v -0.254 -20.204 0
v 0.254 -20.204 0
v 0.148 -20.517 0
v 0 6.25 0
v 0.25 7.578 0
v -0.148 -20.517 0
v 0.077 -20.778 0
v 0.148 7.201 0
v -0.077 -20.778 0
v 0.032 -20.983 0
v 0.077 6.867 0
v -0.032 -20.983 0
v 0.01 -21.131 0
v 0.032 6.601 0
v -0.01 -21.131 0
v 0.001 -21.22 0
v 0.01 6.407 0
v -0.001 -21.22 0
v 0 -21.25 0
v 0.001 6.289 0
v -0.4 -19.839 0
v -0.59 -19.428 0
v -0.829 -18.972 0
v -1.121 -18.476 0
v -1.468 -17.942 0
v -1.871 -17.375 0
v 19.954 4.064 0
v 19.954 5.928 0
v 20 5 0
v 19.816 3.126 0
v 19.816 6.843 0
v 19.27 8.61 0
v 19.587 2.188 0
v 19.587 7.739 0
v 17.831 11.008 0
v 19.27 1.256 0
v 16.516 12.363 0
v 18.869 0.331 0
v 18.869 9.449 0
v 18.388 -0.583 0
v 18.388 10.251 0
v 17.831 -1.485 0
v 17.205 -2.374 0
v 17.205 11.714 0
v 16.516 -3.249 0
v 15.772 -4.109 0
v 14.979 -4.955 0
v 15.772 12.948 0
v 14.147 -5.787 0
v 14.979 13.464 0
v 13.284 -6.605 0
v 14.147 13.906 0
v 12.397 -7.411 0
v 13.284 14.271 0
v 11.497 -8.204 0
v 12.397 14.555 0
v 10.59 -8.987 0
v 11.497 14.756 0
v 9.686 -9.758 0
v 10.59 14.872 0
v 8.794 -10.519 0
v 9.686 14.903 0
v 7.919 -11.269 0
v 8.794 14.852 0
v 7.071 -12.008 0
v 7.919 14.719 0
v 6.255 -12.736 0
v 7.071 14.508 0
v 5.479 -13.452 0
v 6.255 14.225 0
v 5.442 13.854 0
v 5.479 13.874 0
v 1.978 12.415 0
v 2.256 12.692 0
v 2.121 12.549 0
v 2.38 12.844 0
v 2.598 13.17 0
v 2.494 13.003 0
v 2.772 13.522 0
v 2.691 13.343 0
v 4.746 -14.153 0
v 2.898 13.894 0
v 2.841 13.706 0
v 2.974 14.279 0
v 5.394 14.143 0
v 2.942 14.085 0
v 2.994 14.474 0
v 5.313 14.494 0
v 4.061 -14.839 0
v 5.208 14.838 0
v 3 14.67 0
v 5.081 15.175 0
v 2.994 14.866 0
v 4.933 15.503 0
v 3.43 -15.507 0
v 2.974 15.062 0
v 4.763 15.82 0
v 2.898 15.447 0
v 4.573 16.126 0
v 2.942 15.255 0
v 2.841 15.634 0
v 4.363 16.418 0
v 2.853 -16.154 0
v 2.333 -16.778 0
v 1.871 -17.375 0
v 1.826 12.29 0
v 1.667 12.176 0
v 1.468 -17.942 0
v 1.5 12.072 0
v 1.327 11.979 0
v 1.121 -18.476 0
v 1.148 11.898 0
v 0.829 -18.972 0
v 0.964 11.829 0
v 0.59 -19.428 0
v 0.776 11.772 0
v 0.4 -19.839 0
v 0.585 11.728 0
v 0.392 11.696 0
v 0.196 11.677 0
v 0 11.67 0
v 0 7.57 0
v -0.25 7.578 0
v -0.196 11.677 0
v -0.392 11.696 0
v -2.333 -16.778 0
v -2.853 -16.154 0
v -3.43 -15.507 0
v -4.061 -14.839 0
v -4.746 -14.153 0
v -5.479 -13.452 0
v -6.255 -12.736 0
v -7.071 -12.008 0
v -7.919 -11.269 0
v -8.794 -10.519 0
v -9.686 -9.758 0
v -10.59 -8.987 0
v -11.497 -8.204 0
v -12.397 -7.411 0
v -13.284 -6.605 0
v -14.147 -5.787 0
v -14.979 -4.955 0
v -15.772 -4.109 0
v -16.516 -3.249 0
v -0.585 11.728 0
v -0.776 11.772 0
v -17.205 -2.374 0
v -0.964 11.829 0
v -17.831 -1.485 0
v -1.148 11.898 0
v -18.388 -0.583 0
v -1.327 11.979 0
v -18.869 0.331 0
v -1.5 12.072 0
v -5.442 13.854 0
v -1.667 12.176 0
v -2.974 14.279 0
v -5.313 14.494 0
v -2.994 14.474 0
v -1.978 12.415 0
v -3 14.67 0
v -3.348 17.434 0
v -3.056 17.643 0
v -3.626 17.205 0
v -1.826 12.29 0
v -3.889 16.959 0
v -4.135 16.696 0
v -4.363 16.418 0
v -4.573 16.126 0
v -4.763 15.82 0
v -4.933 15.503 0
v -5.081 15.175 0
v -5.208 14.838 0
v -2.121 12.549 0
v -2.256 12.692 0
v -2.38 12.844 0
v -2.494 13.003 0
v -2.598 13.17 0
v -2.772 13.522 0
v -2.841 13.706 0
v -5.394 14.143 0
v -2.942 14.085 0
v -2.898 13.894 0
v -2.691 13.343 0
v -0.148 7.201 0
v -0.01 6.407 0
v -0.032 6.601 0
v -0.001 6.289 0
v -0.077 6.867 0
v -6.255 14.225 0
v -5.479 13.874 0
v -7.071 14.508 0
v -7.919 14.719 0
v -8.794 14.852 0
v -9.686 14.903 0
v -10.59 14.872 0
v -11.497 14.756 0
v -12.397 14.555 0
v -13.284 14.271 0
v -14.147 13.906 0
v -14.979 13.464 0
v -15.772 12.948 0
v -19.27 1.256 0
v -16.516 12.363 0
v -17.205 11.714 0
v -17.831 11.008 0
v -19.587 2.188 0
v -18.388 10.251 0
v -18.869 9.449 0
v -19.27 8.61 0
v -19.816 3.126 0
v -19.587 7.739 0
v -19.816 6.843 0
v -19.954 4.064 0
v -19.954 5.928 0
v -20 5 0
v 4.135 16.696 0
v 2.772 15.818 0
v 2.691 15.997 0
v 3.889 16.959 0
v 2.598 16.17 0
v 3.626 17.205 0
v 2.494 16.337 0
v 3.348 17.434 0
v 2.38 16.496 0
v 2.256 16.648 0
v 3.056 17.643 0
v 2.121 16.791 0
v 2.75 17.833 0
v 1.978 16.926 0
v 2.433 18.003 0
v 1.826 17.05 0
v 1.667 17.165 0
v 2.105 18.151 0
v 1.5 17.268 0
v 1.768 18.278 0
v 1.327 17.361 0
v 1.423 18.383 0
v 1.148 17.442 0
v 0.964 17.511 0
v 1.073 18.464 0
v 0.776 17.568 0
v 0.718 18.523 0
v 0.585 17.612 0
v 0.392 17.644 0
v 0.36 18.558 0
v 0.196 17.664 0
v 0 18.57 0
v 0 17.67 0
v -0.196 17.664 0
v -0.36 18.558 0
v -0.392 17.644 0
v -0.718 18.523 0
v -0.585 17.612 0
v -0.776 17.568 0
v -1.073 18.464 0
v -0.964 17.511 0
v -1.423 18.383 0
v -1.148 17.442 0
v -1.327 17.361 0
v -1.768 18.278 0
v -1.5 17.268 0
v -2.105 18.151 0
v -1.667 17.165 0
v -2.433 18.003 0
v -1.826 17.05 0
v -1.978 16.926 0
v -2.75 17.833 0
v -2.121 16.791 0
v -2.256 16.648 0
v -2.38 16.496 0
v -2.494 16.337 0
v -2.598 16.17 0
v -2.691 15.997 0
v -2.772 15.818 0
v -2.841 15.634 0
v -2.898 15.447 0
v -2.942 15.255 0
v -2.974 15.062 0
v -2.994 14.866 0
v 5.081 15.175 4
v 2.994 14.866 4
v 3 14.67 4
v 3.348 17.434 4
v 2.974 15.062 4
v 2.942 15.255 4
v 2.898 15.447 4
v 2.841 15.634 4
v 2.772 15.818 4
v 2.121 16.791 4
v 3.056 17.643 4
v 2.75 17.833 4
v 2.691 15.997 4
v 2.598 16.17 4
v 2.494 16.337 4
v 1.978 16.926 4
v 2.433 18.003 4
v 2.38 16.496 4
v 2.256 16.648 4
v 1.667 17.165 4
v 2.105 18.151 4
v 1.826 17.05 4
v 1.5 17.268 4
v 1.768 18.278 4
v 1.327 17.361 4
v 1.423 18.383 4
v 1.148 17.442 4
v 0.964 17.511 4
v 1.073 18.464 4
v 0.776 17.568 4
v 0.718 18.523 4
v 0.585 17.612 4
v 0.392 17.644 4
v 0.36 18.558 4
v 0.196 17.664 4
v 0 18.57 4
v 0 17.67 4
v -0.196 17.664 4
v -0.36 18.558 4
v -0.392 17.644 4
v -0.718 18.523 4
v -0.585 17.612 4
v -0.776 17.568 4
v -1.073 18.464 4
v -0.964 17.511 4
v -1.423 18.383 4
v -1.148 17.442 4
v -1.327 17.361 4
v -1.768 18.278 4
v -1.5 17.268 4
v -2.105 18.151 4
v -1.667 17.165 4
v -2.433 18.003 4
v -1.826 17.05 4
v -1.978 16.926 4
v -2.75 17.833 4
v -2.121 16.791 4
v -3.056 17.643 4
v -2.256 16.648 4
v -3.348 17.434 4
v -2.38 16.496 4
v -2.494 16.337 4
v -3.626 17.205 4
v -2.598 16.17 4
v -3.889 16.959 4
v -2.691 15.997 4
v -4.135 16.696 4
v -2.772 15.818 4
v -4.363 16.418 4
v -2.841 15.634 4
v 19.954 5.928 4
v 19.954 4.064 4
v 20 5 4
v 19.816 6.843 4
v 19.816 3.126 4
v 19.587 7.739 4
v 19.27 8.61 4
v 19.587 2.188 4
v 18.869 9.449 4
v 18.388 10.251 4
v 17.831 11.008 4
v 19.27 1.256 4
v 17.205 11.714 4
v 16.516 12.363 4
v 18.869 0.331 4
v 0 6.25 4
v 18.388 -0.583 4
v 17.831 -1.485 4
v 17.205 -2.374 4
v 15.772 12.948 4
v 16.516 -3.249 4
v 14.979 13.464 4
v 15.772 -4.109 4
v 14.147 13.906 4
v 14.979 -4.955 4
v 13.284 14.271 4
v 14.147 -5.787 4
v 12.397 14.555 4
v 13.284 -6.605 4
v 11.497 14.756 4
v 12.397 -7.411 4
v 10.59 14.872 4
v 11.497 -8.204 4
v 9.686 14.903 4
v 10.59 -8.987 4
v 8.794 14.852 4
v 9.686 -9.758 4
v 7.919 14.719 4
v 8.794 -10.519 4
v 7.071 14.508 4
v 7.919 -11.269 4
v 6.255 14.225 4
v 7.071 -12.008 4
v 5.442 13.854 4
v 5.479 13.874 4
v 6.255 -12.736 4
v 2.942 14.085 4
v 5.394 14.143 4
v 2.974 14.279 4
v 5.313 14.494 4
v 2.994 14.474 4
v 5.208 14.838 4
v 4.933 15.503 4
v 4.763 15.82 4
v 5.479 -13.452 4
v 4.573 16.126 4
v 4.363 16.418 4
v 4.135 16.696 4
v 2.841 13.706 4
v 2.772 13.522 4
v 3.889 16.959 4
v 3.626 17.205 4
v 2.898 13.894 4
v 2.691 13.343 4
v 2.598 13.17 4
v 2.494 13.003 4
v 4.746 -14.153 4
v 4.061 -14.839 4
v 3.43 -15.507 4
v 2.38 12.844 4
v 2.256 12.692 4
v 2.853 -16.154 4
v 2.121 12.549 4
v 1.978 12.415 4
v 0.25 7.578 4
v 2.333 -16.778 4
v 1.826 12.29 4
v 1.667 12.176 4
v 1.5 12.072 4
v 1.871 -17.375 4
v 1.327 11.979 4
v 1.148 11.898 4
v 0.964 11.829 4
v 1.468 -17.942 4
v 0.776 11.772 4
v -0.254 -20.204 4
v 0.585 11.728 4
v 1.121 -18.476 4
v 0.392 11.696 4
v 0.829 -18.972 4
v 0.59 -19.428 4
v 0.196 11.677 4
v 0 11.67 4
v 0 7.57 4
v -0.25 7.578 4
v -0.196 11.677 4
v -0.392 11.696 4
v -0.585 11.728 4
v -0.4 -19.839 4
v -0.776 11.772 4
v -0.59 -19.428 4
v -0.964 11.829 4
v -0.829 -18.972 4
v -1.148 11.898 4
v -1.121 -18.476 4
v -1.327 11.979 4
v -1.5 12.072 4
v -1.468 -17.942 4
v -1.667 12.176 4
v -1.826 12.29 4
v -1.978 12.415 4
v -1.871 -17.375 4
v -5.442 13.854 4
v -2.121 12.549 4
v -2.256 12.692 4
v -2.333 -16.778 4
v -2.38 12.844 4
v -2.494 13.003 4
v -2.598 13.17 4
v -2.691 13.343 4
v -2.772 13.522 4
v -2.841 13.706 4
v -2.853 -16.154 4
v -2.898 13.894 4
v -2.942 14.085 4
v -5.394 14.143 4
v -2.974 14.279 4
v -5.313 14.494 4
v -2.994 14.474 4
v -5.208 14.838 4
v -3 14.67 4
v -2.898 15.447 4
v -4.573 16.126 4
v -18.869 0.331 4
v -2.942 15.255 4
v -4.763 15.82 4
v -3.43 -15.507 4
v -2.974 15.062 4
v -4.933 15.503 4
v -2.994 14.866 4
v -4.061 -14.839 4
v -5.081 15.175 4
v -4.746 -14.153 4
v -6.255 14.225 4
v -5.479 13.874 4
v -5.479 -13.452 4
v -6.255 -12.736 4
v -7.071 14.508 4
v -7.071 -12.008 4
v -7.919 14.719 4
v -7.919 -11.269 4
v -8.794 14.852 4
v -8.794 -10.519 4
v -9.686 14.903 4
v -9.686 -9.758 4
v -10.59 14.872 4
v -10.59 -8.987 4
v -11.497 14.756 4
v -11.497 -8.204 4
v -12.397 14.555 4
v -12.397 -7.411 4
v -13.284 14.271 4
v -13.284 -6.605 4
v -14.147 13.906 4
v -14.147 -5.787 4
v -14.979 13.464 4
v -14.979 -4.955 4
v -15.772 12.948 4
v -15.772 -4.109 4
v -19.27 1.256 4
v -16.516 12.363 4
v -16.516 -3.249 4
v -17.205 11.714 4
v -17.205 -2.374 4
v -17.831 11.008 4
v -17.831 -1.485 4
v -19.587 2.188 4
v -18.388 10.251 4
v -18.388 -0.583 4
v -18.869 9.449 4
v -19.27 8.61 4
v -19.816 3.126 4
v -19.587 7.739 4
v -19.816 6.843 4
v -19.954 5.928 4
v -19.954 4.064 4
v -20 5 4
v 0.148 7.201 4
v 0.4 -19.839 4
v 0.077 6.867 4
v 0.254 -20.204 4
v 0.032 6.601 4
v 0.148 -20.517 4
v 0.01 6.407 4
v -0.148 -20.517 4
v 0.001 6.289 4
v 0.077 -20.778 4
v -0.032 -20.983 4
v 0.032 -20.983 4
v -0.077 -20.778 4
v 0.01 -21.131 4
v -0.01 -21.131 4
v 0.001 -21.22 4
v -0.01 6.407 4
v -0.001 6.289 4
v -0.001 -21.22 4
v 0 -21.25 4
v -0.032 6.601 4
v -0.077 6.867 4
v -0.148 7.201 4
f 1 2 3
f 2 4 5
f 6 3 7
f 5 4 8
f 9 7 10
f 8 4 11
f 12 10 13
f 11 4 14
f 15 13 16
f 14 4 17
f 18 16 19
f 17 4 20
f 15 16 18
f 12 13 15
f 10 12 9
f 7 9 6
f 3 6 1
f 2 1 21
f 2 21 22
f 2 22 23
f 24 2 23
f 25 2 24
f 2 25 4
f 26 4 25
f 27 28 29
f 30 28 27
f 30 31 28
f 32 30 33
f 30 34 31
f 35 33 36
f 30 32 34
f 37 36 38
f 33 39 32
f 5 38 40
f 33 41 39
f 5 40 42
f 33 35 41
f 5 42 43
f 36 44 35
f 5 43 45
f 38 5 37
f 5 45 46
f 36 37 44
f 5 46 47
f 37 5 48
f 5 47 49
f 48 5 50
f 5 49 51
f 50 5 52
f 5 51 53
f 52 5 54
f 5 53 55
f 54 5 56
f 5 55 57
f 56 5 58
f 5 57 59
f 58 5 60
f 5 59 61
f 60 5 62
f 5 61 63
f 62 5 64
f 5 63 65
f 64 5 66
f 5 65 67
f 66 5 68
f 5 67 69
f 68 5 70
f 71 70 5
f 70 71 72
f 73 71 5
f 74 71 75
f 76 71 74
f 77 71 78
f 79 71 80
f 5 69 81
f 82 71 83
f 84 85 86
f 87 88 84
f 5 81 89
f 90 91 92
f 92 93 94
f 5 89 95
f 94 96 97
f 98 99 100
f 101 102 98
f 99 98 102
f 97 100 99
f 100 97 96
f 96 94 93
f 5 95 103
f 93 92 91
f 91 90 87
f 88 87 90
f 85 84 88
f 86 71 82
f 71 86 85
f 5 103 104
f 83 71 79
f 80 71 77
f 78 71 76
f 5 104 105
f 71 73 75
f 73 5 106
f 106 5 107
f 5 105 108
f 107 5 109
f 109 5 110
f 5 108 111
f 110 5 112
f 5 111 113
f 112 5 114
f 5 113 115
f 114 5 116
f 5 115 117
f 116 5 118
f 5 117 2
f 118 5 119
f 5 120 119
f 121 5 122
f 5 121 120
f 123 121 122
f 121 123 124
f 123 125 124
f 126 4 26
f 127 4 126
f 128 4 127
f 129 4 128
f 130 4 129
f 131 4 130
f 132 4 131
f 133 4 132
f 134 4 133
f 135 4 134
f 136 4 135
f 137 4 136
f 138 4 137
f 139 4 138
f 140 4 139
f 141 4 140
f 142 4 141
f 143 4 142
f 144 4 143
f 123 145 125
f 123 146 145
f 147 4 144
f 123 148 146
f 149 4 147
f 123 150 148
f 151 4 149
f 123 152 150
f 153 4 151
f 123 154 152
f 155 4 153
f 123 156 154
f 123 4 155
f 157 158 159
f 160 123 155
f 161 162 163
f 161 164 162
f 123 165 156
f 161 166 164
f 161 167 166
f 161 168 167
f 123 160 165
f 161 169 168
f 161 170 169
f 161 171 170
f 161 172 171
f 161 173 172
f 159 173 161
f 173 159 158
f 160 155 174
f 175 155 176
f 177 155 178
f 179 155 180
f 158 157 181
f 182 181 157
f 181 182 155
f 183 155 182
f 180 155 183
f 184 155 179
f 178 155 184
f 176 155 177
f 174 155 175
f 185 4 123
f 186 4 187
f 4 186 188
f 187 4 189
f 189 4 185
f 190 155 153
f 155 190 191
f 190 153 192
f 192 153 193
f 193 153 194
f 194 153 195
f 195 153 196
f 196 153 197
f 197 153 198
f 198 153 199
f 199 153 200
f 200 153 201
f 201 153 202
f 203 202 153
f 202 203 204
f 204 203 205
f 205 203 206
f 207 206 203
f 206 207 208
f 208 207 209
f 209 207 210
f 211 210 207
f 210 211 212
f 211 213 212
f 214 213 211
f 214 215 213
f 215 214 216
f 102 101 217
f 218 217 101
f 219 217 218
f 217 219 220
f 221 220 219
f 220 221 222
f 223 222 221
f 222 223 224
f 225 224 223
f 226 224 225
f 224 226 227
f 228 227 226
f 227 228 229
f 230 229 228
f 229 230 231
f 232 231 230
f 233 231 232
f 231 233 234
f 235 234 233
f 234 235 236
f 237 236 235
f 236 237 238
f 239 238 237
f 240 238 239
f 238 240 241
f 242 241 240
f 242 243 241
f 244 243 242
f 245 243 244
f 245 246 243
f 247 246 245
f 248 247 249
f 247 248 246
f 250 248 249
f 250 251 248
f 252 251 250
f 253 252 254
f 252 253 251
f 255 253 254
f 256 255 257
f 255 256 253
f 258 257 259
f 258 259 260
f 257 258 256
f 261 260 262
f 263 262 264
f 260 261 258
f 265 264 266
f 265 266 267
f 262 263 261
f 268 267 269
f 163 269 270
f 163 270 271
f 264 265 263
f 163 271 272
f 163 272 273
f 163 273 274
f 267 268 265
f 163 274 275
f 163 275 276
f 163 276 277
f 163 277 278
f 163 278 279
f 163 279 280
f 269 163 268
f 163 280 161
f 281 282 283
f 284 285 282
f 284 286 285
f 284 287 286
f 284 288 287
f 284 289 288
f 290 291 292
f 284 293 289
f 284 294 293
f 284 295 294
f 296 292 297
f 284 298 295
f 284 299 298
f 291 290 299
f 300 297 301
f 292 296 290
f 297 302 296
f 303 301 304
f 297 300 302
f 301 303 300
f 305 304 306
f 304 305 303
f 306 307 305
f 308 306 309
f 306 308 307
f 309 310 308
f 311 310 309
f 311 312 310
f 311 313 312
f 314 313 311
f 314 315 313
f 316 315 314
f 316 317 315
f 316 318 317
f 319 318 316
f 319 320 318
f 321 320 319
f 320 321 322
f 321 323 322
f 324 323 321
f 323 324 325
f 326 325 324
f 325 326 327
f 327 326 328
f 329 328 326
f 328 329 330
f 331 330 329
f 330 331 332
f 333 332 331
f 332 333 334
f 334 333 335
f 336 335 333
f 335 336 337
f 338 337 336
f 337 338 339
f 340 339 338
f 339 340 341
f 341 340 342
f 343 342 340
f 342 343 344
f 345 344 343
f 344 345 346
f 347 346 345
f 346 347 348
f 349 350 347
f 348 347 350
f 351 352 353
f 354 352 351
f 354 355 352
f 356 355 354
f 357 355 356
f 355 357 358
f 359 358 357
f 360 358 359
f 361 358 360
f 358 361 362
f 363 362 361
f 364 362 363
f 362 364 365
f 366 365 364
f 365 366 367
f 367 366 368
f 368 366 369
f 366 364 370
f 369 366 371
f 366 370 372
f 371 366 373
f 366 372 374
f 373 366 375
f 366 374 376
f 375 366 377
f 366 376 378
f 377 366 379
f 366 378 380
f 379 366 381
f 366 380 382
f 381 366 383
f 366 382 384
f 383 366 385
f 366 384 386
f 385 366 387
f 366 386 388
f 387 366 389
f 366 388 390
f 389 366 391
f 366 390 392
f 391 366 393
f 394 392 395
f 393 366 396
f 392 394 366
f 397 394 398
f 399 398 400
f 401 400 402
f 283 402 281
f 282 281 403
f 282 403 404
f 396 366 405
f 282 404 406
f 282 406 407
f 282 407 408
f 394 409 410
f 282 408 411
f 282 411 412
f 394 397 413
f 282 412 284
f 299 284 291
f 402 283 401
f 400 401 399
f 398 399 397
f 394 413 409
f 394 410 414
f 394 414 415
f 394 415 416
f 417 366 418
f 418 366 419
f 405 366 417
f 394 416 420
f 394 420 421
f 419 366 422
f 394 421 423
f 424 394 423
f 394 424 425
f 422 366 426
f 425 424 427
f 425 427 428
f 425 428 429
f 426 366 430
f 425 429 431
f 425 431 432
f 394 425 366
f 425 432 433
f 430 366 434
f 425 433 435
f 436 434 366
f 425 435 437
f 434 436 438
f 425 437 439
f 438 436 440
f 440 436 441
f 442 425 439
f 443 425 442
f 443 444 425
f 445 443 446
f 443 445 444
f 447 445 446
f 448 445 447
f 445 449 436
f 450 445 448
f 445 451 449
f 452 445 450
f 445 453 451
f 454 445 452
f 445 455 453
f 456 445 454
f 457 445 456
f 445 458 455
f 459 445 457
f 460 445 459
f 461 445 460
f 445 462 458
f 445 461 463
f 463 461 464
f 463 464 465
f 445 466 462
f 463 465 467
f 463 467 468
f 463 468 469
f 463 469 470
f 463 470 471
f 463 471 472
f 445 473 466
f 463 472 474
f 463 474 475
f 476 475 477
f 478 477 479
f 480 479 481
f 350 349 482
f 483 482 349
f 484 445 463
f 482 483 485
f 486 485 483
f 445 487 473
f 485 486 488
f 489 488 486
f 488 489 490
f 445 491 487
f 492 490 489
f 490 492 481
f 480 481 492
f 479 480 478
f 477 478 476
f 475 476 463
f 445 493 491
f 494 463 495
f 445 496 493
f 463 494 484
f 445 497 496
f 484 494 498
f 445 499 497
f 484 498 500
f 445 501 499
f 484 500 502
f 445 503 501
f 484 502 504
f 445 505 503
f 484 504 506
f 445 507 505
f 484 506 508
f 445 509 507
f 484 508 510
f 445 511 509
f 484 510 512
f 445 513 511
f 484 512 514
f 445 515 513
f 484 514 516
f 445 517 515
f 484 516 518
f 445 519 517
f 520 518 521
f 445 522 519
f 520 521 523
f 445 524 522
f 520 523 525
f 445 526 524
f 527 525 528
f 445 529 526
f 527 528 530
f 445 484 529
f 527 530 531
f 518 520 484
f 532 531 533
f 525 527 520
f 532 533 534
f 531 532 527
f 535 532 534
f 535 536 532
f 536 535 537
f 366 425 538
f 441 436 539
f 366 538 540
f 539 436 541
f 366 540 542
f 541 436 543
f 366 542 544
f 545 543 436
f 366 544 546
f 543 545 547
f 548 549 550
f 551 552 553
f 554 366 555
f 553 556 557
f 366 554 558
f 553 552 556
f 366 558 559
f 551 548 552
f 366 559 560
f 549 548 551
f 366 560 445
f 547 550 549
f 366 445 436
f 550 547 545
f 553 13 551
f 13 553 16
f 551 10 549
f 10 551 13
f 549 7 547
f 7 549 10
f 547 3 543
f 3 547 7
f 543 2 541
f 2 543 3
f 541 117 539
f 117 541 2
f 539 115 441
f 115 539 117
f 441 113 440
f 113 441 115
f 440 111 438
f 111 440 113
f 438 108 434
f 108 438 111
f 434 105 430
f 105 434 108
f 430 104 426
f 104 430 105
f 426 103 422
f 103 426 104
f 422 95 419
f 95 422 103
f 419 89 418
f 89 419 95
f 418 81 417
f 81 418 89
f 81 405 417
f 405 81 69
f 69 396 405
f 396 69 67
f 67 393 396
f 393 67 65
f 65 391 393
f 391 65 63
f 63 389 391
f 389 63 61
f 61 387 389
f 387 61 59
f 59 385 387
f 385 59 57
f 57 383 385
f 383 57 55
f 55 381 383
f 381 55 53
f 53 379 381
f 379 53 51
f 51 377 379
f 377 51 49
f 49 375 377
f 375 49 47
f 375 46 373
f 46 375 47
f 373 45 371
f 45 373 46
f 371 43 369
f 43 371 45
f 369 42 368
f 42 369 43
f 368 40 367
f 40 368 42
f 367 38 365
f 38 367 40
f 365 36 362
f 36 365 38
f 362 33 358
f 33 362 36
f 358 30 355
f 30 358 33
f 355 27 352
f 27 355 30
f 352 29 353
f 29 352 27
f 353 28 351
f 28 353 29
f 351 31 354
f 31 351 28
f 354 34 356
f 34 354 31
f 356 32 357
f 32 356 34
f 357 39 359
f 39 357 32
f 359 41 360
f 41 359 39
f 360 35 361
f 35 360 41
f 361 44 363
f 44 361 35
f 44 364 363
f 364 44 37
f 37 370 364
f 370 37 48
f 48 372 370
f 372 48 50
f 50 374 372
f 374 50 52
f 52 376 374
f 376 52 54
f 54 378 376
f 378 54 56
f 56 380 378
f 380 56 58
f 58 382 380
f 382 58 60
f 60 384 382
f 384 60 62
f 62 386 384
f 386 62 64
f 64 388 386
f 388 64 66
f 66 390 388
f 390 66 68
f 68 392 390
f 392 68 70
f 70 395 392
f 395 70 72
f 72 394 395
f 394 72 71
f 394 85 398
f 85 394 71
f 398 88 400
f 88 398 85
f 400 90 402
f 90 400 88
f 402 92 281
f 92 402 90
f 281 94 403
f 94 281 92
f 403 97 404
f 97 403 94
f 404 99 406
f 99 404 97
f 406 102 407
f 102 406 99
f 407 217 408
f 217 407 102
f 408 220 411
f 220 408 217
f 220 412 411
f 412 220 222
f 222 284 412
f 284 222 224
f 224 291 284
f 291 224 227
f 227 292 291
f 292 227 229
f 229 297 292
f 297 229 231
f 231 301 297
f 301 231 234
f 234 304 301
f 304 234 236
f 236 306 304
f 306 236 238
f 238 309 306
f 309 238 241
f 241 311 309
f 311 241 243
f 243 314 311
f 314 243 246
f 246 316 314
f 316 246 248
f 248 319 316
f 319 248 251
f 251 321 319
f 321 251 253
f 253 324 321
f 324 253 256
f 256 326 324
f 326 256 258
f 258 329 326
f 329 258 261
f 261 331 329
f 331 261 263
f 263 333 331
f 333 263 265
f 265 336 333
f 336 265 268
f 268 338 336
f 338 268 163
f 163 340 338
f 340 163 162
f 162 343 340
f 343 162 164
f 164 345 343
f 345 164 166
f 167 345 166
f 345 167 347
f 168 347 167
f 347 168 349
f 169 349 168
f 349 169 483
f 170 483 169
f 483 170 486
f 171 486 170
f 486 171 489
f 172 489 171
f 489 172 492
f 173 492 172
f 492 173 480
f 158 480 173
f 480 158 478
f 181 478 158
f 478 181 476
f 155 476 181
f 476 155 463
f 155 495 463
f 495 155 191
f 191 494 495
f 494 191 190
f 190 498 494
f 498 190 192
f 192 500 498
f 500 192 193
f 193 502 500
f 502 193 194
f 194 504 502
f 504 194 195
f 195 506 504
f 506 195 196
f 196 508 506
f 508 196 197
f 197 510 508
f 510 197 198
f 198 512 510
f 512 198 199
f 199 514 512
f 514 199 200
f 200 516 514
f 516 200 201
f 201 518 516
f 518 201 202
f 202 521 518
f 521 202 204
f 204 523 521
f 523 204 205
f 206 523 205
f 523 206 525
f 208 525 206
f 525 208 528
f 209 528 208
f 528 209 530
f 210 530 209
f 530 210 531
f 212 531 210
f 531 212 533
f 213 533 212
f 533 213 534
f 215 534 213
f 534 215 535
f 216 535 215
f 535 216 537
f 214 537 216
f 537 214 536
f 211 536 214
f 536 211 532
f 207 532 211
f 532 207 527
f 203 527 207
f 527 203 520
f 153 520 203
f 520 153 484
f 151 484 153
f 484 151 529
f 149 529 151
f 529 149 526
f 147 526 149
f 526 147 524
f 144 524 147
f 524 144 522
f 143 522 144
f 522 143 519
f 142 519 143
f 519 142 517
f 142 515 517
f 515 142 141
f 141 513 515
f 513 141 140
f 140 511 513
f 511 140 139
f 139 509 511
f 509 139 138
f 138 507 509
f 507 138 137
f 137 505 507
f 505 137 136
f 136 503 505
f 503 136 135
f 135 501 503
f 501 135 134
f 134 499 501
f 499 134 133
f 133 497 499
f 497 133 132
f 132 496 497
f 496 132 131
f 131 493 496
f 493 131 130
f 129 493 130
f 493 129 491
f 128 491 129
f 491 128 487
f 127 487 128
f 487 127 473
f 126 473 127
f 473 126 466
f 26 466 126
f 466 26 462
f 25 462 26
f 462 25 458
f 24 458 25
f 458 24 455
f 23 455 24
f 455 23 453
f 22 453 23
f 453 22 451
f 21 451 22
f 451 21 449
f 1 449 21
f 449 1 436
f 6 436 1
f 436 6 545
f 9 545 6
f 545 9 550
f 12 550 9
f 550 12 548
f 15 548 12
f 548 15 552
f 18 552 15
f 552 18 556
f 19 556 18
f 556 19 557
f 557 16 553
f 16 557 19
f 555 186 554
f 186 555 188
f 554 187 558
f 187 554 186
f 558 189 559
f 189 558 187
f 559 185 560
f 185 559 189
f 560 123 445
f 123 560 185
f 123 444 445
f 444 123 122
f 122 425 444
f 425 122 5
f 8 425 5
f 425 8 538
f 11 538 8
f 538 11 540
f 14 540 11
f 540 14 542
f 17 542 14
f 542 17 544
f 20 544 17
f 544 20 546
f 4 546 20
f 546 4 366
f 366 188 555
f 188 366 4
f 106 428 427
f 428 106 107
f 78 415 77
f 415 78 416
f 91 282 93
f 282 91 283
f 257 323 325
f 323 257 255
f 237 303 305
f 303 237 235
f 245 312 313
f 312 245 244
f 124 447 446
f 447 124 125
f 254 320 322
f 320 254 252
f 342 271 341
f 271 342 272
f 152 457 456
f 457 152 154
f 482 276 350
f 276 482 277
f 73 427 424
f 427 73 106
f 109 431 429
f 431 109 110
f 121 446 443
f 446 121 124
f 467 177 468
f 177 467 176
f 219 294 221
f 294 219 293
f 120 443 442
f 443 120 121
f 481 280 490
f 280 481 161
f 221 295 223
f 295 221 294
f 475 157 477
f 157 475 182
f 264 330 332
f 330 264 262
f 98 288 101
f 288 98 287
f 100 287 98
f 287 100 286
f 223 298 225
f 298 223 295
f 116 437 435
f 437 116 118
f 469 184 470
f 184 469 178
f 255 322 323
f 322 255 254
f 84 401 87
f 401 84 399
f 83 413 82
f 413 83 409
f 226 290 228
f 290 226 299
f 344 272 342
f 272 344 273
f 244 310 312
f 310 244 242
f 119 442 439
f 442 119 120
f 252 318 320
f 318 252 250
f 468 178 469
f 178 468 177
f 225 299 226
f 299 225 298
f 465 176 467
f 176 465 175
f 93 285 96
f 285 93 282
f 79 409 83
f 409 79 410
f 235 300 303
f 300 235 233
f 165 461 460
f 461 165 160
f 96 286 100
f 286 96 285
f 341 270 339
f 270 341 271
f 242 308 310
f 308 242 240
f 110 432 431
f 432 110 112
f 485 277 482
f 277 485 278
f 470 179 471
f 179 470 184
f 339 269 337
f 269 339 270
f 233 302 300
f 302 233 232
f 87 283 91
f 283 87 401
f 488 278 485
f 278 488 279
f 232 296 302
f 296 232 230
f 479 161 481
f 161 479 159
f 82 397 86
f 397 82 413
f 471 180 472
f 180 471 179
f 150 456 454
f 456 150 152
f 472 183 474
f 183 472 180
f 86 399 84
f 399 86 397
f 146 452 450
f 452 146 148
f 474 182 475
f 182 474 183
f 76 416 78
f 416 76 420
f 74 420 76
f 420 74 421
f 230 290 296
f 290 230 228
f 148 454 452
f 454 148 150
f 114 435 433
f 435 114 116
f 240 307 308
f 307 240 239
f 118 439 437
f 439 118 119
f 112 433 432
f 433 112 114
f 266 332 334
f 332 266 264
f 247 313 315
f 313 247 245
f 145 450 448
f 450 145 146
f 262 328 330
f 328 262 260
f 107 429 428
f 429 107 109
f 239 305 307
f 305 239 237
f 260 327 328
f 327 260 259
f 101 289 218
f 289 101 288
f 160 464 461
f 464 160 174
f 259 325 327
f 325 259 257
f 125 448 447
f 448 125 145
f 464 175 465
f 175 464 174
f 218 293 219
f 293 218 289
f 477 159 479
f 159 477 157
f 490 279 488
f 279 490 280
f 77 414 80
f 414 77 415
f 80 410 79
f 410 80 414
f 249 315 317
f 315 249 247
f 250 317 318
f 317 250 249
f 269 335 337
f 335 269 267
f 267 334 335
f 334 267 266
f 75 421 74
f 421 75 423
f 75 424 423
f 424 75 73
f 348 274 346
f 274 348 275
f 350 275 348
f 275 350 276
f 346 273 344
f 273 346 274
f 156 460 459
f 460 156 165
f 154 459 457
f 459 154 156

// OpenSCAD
// Heart keychain — heart + fused top ring (one solid for printing)
// Units: mm

$fn = 96;

// ---- Body ----
T = 4;
scale_heart = 1.25;

// ---- Top ring ----
ring_outer_r = 5.5;
ring_inner_r = 3;      // slightly smaller helps keep side struts after hole cut

// Fraction of ring *diameter* (2*outer_r) that should overlap the heart downward (typ. 1/3)
ring_overlap_frac = 2/3;

// Hole center is shifted +Y so the cylinder does not eat the neck between heart and ring (see header comment)
hole_lift_y = 1.6;
// Extra nudge down if your preview still shows two bodies (e.g. -0.3 .. -0.8)
ring_cy_adjust = 0;

// Parametric heart (t in degrees)
function heart_xy(t) = [
  16 * pow(sin(t), 3),
  13 * cos(t) - 5 * cos(2 * t) - 2 * cos(3 * t) - cos(4 * t)
];

function max_list(a, i = 0, m = -1e9) =
  i >= len(a) ? m : max_list(a, i + 1, max(m, a[i]));

steps = 160;
heart_pts = [ for (i = [0 : steps - 1])
  let (t = i * 360 / steps)
    heart_xy(t) * scale_heart
];

heart_y_max = max_list([for (p = heart_pts) p[1]]);
// Overlap depth along +Y into heart ≈ ring_overlap_frac * 2 * ring_outer_r
ring_cy = heart_y_max + ring_outer_r * (1 - 2 * ring_overlap_frac) + ring_cy_adjust;
hole_y = ring_cy + hole_lift_y;

difference() {
  linear_extrude(T, center = false)
    union() {
      polygon(heart_pts);
      translate([0, ring_cy])
        circle(r = ring_outer_r);
    }
  translate([0, hole_y, -0.01])
    cylinder(h = T + 0.02, r = ring_inner_r);
}
